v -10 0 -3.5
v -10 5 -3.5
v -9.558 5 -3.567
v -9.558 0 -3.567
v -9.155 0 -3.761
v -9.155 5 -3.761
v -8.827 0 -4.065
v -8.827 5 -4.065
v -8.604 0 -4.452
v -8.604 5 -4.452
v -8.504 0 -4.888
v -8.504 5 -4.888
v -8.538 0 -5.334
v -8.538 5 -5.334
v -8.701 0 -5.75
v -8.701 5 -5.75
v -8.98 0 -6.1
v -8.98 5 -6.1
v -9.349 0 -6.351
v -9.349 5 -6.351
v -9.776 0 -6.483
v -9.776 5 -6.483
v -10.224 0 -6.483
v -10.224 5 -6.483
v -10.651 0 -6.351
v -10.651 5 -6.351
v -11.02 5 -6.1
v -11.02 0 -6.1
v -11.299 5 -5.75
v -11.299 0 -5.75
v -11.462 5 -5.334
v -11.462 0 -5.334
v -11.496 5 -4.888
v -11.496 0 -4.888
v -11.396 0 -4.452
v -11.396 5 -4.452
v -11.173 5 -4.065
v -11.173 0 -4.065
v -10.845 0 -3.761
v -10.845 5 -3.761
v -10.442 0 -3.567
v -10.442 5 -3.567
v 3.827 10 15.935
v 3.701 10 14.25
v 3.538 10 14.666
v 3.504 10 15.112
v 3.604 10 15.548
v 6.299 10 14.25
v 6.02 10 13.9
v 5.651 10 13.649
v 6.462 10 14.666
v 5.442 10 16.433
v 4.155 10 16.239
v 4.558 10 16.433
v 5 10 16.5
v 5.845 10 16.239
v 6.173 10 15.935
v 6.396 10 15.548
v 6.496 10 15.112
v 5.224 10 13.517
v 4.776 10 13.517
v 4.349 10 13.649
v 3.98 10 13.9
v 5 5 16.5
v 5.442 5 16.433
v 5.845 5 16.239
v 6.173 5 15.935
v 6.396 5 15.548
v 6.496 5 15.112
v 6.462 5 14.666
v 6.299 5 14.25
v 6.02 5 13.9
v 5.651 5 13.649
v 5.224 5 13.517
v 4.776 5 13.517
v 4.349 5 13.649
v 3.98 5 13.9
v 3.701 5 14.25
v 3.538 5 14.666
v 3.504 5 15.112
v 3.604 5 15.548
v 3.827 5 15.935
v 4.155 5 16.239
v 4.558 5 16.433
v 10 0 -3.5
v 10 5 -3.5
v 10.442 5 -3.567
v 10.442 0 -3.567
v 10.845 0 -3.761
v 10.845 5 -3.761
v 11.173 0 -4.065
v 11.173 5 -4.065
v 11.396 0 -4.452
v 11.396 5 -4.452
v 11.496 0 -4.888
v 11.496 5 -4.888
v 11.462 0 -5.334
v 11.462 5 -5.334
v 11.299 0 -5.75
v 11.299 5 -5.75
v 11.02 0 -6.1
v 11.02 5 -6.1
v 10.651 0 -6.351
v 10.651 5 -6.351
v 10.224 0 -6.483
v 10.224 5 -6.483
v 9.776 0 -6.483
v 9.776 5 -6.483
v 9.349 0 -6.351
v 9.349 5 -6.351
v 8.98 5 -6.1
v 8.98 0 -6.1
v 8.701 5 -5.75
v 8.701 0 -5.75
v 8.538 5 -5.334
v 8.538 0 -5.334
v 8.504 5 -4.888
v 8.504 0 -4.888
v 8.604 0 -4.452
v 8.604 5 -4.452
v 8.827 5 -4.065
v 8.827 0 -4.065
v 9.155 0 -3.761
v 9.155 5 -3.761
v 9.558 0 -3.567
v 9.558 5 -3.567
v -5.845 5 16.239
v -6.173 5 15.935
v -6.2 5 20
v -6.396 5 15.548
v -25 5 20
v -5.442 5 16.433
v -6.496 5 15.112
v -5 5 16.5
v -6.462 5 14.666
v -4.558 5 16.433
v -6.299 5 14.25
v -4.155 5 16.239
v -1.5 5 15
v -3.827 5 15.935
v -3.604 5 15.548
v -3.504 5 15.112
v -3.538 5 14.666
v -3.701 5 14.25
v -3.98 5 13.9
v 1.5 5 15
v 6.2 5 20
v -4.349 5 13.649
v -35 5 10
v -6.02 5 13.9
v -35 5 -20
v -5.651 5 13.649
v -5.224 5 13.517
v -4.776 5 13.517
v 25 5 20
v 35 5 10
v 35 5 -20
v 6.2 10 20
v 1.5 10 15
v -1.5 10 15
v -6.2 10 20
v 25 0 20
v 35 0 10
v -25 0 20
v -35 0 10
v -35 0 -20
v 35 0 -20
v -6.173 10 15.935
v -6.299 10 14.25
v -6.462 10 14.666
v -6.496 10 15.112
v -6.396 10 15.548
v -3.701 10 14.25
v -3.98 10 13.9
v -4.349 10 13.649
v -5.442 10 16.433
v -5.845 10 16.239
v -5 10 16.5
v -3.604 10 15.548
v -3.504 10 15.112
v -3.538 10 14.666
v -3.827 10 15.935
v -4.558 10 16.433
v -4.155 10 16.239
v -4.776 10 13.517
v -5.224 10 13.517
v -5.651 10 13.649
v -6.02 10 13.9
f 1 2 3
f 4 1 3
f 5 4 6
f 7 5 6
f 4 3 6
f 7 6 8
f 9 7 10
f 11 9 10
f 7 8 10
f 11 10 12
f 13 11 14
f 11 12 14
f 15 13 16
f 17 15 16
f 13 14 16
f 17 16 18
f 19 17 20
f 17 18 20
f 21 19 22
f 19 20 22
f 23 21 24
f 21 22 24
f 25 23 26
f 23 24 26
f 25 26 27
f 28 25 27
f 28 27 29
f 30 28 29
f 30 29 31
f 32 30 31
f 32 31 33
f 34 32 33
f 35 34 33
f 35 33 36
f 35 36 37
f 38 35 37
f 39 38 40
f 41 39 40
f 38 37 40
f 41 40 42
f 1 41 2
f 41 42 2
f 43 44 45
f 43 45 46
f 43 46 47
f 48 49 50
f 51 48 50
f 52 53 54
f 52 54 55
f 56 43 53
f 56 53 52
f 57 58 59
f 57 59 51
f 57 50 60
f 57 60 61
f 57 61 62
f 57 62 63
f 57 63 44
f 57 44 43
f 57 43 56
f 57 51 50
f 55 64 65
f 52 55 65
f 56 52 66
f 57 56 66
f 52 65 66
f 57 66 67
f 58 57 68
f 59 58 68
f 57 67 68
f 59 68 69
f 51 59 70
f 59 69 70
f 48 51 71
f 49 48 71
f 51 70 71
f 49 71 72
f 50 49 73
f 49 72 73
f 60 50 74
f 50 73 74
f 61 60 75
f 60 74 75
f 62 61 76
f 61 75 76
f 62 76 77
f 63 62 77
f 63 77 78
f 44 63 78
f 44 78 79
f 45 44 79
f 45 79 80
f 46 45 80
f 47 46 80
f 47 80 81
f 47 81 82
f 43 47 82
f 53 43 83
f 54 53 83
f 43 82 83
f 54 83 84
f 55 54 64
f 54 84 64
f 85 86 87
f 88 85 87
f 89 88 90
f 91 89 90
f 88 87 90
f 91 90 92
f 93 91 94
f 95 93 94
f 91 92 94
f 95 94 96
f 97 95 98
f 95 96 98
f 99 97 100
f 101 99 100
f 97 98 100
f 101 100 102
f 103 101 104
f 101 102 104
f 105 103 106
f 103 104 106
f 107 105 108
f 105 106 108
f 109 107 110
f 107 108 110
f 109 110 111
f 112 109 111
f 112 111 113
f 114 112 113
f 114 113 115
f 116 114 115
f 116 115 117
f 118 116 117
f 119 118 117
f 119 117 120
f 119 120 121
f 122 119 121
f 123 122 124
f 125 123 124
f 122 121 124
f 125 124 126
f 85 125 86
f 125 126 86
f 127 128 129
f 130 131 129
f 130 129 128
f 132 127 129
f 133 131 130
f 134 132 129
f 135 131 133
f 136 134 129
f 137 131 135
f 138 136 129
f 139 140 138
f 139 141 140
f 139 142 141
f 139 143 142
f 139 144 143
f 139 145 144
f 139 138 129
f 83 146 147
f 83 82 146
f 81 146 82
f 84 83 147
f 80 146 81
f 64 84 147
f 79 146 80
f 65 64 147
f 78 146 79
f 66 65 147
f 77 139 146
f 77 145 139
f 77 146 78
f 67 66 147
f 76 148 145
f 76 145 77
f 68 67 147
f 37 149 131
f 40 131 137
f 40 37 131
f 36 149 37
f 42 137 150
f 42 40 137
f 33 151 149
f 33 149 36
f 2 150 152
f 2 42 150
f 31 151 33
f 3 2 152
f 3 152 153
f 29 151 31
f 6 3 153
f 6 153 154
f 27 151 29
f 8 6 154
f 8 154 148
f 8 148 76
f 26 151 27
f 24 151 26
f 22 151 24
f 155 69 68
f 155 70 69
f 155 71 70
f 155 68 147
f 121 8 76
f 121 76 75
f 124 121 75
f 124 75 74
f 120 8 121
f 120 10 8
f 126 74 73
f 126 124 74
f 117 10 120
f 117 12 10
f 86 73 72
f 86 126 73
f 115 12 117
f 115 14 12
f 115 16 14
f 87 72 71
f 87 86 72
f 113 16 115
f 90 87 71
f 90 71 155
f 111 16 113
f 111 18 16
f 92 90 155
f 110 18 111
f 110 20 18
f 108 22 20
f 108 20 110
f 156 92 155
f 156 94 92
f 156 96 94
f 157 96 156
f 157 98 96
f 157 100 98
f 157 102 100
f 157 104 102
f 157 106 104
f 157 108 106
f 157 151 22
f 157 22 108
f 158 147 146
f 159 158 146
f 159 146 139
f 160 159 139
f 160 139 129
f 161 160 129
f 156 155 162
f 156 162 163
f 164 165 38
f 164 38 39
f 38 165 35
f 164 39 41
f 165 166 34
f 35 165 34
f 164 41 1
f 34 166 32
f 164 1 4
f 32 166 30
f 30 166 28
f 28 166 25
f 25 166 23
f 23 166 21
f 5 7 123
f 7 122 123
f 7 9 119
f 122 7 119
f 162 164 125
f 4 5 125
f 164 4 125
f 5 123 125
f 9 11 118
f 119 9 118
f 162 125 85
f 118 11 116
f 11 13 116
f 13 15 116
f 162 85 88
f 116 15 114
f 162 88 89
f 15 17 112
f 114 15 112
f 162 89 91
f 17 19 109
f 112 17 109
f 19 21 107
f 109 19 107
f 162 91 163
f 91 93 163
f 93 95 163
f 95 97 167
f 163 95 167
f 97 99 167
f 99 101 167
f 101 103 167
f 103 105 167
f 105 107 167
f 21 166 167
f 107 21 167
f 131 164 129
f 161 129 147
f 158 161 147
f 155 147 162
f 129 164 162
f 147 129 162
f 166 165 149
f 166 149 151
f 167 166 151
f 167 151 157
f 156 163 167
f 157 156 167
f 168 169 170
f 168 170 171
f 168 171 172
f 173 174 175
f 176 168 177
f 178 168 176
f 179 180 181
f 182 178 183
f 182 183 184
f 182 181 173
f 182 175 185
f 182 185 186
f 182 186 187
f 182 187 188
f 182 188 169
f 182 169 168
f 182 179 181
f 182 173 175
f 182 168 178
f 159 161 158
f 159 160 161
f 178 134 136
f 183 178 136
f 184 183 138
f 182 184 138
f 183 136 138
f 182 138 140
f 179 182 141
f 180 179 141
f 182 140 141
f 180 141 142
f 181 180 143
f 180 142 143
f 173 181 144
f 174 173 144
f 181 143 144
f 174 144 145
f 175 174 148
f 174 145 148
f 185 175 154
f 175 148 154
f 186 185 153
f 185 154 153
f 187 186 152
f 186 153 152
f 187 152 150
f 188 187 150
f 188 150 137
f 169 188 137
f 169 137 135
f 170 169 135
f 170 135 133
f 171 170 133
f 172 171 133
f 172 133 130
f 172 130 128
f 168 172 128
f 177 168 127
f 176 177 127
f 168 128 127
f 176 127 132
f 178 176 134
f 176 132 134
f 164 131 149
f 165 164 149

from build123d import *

# Parameters (mm, degrees)
SKETCH1_W           = 70
SKETCH1_H           = 40
BOSS_EXTRUDE1_DEPTH = 5
SKETCH2_R           = 1.5
CUT_EXTRUDE1_DEPTH  = 5
SKETCH2_3_R         = 1.5
CUT_EXTRUDE2_DEPTH  = 5
SKETCH3_R           = 1.5
BOSS_EXTRUDE2_DEPTH = 5
SKETCH3_3_R         = 1.5
BOSS_EXTRUDE3_DEPTH = 5
CUT_EXTRUDE3_DEPTH  = 10
CUT_EXTRUDE4_DEPTH  = 10
BOSS_EXTRUDE4_DEPTH = 5


with BuildPart() as part:
    # Sketch1 → Boss-Extrude1 (new body)
    with BuildSketch(Plane(origin=(0, 0, 0), x_dir=(1, 0, 0), z_dir=(0, 1, 0))):
        Rectangle(SKETCH1_W, SKETCH1_H)
    extrude(amount=BOSS_EXTRUDE1_DEPTH)

    # Sketch2 → Cut-Extrude1 (cut)
    with BuildSketch(Plane(origin=(0, 5, 0), x_dir=(1, 0, 0), z_dir=(0, 1, 0))):
        with Locations((-10, 5)):
            Circle(SKETCH2_R)
    extrude(amount=-CUT_EXTRUDE1_DEPTH, mode=Mode.SUBTRACT)

    # Sketch2<3> → Cut-Extrude2 (cut)
    with BuildSketch(Plane(origin=(0, 5, 0), x_dir=(1, 0, 0), z_dir=(0, 1, 0))):
        with Locations((-10, 5)):
            Circle(SKETCH2_3_R)
        with Locations((10, 5)):
            Circle(SKETCH2_3_R)
    extrude(amount=-CUT_EXTRUDE2_DEPTH, mode=Mode.SUBTRACT)

    # Sketch3 → Boss-Extrude2 (add)
    with BuildSketch(Plane(origin=(0, 5, 0), x_dir=(1, 0, 0), z_dir=(0, 1, 0))):
        with Locations((-5, -15)):
            Circle(SKETCH3_R)
    extrude(amount=BOSS_EXTRUDE2_DEPTH)

    # Sketch3<3> → Boss-Extrude3 (add)
    with BuildSketch(Plane(origin=(0, 5, 0), x_dir=(1, 0, 0), z_dir=(0, 1, 0))):
        with Locations((-5, -15)):
            Circle(SKETCH3_3_R)
        with Locations((5, -15)):
            Circle(SKETCH3_3_R)
    extrude(amount=BOSS_EXTRUDE3_DEPTH)

    # Sketch8 → Cut-Extrude3 (cut)
    with BuildSketch(Plane(origin=(0, 5, 0), x_dir=(1, 0, 0), z_dir=(0, 1, 0))):
        Polygon((-25, -20), (-35, -10), (-35, -20), align=None)
    extrude(amount=-CUT_EXTRUDE3_DEPTH, mode=Mode.SUBTRACT)

    # Sketch9 → Cut-Extrude4 (cut)
    with BuildSketch(Plane(origin=(0, 5, 0), x_dir=(1, 0, 0), z_dir=(0, 1, 0))):
        Polygon((35, -20), (25, -20), (35, -10), align=None)
    extrude(amount=-CUT_EXTRUDE4_DEPTH, mode=Mode.SUBTRACT)

    # Sketch13 → Boss-Extrude4 (add)
    with BuildSketch(Plane(origin=(0, 5, 0), x_dir=(1, 0, 0), z_dir=(0, 1, 0))):
        Polygon((-6.2, -20), (6.2, -20), (1.5, -15), (-1.5, -15), align=None)
    extrude(amount=BOSS_EXTRUDE4_DEPTH)


solid = part.part
